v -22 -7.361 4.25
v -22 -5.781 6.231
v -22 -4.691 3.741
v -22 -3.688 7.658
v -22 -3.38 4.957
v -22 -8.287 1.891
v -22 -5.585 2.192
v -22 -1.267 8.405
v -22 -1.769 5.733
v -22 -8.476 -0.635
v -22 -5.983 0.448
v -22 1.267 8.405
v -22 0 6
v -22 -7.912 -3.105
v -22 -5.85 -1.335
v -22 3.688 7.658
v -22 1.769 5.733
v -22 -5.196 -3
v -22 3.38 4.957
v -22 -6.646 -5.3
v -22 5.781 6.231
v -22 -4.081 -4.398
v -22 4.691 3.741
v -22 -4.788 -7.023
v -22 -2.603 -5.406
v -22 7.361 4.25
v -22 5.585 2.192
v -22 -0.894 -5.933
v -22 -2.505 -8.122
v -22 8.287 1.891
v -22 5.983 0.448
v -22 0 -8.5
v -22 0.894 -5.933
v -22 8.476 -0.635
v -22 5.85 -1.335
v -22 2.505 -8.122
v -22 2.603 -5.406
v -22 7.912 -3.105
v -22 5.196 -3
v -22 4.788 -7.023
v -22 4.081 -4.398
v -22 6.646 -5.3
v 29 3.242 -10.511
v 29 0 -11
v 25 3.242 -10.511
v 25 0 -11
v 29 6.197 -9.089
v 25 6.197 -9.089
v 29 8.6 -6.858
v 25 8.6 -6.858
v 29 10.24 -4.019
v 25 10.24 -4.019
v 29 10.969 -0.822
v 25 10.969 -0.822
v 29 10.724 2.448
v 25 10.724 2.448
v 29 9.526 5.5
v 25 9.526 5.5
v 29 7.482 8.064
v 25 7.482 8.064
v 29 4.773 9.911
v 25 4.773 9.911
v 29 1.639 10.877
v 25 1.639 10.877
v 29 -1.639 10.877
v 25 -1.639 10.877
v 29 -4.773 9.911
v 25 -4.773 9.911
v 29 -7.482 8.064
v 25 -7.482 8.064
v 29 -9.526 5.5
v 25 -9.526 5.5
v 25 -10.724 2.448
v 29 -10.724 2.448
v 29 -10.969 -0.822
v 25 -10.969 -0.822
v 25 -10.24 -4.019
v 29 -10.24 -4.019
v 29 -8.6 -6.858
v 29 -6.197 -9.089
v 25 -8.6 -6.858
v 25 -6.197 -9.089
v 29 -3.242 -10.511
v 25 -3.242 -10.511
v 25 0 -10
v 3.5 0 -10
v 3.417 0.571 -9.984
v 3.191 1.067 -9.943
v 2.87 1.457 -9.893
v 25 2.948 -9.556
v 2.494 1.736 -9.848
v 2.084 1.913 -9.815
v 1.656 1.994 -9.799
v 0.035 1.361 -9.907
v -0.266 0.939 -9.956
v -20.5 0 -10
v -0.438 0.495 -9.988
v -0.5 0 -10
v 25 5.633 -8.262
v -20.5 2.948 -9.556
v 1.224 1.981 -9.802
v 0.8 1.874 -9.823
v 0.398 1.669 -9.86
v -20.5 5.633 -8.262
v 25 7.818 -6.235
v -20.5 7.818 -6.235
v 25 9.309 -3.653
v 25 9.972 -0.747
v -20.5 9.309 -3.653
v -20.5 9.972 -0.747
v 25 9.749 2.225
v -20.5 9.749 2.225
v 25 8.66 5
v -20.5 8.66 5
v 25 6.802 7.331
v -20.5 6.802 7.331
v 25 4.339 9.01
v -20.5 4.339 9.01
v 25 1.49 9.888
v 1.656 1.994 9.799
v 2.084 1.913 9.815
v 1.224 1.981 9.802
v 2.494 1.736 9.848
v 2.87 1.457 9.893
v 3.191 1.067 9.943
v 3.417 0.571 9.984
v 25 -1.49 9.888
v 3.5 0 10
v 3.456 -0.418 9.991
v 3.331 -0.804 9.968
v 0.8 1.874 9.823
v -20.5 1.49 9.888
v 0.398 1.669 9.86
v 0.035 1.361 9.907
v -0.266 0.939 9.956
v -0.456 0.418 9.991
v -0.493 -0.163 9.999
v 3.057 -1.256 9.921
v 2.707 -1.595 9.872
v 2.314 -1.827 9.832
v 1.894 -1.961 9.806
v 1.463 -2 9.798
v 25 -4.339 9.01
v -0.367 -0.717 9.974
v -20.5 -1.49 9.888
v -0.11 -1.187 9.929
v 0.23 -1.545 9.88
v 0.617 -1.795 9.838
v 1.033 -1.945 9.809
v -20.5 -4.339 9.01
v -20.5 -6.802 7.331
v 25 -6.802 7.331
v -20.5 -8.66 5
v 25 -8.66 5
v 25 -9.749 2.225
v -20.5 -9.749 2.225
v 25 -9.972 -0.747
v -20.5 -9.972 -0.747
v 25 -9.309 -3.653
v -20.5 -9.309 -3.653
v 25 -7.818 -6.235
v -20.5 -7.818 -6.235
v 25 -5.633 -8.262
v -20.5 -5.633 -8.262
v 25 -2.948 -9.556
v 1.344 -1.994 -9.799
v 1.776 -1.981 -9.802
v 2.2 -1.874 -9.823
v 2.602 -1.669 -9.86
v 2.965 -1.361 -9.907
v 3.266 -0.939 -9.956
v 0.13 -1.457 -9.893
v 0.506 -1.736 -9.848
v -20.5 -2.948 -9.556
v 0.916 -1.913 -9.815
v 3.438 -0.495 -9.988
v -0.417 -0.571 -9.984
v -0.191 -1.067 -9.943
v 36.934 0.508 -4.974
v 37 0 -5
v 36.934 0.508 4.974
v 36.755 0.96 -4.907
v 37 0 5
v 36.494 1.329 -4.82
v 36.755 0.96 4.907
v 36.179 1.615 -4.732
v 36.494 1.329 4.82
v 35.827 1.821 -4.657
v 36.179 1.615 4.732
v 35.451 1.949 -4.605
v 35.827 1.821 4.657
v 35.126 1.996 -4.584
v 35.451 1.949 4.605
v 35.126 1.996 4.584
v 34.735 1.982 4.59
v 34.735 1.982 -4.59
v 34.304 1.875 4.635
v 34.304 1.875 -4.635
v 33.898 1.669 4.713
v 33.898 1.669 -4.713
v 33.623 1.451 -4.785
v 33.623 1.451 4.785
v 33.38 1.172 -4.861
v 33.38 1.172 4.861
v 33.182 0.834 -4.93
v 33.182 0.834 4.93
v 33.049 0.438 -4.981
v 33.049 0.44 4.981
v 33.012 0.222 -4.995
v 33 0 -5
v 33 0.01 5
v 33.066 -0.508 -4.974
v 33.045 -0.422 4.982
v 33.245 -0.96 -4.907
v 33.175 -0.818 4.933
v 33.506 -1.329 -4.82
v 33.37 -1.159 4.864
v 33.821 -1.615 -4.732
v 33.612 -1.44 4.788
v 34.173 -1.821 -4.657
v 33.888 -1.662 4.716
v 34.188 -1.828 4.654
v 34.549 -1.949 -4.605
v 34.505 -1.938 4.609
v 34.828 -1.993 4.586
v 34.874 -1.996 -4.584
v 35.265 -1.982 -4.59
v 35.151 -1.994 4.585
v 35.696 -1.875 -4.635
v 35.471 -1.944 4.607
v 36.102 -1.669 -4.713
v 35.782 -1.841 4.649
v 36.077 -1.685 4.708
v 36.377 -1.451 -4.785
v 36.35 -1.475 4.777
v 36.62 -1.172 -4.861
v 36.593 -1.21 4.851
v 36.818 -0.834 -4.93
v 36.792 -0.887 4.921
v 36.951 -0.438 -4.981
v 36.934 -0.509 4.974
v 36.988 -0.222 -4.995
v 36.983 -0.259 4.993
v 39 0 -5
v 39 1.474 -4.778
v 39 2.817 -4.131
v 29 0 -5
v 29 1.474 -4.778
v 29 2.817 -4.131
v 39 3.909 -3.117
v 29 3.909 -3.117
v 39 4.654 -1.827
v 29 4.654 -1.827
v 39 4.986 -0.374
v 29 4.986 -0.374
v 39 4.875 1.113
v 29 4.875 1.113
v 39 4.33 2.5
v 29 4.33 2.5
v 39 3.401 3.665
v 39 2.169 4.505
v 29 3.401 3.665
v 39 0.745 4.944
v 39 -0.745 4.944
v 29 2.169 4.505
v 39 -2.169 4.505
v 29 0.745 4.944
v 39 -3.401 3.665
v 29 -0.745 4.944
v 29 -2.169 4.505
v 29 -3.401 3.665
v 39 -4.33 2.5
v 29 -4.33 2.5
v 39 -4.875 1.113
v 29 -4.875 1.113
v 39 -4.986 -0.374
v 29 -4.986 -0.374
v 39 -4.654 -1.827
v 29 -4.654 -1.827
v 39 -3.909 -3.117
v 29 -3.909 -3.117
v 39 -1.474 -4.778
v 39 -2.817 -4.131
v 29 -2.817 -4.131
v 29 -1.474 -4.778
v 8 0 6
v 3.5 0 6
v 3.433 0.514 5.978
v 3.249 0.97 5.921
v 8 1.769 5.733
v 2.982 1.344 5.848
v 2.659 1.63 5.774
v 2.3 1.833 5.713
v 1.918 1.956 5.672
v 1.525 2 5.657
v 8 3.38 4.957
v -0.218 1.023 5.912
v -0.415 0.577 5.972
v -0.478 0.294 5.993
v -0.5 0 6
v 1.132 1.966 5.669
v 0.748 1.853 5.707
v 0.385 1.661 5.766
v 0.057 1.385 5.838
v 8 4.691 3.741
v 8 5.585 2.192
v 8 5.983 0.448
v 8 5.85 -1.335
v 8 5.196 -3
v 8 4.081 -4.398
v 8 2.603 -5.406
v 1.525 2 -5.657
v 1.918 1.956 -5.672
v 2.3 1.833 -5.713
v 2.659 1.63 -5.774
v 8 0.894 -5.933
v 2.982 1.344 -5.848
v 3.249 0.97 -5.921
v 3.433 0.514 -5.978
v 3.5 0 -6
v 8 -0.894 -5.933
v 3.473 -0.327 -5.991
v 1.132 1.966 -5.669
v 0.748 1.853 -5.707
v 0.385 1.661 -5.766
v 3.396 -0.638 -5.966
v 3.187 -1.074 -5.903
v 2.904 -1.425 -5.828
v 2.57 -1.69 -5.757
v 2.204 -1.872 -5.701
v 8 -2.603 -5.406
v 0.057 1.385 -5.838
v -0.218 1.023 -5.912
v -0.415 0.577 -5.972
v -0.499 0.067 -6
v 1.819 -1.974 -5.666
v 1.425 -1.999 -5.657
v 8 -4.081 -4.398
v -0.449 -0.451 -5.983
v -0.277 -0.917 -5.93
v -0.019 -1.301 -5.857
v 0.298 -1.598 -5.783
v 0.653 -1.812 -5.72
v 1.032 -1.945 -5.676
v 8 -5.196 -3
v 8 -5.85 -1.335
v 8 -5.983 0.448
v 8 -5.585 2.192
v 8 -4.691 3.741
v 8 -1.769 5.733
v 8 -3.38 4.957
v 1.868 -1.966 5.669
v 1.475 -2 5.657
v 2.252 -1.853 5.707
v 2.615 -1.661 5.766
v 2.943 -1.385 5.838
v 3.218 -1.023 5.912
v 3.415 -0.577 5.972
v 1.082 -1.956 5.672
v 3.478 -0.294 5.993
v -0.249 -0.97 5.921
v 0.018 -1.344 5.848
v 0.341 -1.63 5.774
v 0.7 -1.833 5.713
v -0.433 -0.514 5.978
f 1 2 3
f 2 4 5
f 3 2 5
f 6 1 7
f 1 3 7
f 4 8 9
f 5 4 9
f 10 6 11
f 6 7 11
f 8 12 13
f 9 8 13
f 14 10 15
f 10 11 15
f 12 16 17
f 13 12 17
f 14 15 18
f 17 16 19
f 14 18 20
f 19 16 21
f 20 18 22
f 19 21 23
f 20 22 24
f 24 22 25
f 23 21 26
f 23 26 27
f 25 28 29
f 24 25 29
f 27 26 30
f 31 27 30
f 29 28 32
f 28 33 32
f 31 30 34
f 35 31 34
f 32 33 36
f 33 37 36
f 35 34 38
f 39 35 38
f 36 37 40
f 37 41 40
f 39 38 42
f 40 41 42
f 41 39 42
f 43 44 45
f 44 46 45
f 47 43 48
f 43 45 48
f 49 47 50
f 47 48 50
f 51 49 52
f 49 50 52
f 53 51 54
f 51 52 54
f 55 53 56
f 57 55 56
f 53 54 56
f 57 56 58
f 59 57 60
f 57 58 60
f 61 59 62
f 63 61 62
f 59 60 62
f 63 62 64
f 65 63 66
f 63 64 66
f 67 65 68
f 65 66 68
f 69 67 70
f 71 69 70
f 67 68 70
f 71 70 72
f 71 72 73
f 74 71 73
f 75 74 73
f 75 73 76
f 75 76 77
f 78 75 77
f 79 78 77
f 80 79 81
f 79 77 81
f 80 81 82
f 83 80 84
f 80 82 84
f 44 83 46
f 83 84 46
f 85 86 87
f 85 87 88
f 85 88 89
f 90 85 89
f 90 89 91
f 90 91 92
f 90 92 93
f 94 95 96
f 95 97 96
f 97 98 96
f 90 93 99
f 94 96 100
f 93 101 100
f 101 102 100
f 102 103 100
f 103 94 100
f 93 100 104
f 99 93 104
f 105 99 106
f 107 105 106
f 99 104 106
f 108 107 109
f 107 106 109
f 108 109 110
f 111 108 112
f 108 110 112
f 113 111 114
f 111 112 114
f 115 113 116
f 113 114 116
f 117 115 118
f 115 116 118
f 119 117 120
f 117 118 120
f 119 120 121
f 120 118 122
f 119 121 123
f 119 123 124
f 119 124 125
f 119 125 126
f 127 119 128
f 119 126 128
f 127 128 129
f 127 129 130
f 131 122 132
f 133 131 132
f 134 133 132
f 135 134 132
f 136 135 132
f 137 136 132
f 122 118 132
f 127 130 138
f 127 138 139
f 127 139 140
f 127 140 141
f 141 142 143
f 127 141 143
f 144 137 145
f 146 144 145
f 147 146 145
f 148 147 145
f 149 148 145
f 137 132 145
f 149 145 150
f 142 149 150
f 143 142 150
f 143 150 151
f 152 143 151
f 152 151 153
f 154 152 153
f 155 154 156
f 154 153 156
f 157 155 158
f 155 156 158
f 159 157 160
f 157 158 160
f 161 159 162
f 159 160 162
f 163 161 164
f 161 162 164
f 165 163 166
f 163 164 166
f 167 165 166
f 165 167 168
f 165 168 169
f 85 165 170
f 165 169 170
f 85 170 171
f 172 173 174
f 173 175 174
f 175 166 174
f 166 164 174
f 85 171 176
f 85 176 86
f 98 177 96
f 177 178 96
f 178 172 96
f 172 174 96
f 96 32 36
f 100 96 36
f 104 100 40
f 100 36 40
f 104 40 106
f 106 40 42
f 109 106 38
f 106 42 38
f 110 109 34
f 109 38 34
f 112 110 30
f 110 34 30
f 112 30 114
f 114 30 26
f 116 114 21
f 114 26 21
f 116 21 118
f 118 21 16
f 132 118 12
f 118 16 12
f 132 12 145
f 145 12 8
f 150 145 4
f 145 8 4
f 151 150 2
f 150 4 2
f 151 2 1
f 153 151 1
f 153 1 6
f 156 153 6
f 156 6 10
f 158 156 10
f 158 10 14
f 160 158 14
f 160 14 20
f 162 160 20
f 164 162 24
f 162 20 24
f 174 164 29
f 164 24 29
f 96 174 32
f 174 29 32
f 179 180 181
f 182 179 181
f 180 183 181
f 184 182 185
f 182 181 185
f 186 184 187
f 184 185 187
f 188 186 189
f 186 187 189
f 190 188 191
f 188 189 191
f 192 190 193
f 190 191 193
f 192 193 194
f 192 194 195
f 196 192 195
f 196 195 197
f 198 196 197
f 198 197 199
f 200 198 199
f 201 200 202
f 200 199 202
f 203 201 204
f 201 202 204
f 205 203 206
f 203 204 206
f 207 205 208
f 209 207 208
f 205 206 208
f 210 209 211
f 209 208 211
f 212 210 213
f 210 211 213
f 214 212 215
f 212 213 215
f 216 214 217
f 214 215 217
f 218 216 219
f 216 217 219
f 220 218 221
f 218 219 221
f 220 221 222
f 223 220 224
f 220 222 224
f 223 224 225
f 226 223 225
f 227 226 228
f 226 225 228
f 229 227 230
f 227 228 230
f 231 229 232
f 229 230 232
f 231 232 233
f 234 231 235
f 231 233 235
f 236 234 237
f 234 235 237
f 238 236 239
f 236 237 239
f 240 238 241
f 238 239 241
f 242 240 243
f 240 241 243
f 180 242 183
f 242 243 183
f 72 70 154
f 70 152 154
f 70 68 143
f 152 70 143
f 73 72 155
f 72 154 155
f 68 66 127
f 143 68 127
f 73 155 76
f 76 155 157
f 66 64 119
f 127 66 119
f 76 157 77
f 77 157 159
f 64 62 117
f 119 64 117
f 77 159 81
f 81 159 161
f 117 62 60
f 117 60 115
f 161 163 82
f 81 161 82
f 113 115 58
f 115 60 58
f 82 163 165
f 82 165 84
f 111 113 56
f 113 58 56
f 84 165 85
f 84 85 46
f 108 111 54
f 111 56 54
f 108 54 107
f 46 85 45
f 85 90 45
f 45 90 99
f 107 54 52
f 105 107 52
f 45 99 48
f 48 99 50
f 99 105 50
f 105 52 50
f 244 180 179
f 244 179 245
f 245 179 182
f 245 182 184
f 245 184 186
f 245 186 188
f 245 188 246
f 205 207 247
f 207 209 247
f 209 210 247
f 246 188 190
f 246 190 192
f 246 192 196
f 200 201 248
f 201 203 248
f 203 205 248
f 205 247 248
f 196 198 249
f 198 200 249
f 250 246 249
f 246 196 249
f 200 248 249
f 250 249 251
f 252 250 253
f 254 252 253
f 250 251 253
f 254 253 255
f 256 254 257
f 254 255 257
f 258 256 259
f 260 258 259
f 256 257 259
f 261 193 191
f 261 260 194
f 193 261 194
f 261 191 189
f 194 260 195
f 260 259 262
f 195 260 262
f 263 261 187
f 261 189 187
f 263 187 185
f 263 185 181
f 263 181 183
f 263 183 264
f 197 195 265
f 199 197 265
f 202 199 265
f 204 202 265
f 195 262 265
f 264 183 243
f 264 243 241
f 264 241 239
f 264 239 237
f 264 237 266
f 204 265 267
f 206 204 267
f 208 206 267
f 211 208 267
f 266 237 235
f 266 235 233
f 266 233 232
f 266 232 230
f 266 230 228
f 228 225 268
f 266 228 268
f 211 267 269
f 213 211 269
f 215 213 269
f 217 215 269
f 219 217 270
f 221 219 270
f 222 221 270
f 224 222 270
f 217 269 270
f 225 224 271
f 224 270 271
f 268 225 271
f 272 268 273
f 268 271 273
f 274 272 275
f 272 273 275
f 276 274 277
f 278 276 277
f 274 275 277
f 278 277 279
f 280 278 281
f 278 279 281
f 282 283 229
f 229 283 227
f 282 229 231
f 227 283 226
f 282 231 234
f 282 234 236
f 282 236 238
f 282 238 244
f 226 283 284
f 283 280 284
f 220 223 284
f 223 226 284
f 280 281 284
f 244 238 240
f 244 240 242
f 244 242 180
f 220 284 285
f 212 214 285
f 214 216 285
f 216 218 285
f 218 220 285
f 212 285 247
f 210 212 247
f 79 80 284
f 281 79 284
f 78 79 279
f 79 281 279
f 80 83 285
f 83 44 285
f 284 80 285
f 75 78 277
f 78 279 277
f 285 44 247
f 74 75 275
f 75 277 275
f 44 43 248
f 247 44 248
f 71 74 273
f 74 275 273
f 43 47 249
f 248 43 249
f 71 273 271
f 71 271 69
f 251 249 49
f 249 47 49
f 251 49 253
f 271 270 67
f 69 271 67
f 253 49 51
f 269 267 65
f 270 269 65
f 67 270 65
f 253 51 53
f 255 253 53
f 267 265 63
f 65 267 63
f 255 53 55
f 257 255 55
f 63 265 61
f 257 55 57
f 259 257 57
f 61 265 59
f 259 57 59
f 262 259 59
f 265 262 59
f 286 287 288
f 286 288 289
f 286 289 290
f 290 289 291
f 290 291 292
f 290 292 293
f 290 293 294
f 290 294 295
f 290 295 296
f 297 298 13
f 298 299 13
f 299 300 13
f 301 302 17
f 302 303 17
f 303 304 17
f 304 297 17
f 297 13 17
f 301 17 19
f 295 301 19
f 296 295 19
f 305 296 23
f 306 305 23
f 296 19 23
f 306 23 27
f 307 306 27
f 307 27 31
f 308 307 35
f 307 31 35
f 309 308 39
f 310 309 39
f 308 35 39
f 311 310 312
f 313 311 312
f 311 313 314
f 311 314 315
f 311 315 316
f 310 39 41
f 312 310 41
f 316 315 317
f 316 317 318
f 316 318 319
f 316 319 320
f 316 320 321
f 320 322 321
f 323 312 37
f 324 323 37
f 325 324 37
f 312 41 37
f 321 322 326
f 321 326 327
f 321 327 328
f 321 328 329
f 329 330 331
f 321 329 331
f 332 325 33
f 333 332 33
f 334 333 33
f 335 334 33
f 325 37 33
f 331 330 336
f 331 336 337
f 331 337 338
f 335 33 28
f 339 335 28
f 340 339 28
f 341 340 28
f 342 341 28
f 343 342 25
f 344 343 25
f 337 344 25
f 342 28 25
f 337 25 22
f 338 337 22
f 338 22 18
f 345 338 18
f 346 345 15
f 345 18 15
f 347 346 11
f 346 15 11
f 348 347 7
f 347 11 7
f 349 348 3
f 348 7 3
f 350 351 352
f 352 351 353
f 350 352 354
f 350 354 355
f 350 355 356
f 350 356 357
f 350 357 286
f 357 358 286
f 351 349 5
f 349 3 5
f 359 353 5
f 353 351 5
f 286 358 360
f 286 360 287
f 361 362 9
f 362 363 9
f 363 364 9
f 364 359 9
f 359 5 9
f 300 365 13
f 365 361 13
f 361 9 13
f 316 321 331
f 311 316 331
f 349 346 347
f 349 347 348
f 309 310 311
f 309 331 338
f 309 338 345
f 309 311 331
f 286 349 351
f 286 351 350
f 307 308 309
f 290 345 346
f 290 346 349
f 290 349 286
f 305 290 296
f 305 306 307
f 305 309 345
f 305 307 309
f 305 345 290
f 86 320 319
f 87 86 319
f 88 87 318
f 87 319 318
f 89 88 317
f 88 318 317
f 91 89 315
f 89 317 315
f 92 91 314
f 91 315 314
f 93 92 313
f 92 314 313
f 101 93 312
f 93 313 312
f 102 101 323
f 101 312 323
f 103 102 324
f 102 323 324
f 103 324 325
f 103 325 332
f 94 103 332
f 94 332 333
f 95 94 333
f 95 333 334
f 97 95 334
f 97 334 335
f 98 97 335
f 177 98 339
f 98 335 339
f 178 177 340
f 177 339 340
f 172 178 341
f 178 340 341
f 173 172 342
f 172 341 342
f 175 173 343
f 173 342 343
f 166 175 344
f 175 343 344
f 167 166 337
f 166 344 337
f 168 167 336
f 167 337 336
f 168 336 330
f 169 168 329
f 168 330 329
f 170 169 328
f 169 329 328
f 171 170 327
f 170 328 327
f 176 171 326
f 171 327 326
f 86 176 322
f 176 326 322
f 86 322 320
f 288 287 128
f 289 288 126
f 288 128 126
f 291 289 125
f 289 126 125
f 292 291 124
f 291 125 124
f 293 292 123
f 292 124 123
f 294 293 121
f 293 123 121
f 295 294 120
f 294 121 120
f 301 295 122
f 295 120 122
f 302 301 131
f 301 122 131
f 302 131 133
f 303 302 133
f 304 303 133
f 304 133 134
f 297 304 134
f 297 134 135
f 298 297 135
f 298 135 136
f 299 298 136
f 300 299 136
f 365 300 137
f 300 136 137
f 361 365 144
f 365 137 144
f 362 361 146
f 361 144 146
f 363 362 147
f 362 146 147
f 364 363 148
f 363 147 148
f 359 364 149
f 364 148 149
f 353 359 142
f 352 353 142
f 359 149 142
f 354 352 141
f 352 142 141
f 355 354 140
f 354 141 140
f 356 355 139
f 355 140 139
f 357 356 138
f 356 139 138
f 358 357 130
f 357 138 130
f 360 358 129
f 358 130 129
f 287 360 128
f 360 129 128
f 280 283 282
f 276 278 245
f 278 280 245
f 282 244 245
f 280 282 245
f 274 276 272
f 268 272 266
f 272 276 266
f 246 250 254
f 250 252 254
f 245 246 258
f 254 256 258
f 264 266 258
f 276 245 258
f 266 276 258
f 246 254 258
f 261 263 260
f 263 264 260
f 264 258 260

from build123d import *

# Parameters (mm, degrees)
SZKIC3_R                   = 6
WYTNIJ_WYCI_GNI_CIE1_DEPTH = 30
SFAZOWANIE1_SIZE           = 1.5
SZKIC6_R                   = 2
WYTNIJ_WYCI_GNI_CIE4_DEPTH = 15


with BuildPart() as part:
    # Szkic1 → Obrót1 (revolve)
    with BuildSketch(Plane(origin=(0, 0, 0), x_dir=(1, 0, 0), z_dir=(0, 1, 0))):
        Polygon((-22, 0), (39, 0), (39, 5), (29, 5), (29, 11), (25, 11), (25, 10), (-22, 10), align=None)
    revolve(axis=Axis((-22, 0, 0), (1, 0, 0)))

    # Szkic3 → Wytnij-wyciągnięcie1 (cut)
    with BuildSketch(Plane.ZY.offset(22)):
        Circle(SZKIC3_R)
    extrude(amount=-WYTNIJ_WYCI_GNI_CIE1_DEPTH, mode=Mode.SUBTRACT)

    # Sfazowanie1
    sfazowanie1_edges = [part.edges().sort_by_distance(p)[0] for p in [
        (-22, 0, 10),
    ]]
    chamfer(sfazowanie1_edges, length=SFAZOWANIE1_SIZE)

    # Szkic6 → Wytnij-wyciągnięcie4 (cut, symmetric)
    with BuildSketch(Plane.XY):
        with Locations((35, 0)):
            Circle(SZKIC6_R)
        with Locations((1.5, 0)):
            Circle(SZKIC6_R)
    extrude(amount=WYTNIJ_WYCI_GNI_CIE4_DEPTH, both=True, mode=Mode.SUBTRACT)


solid = part.part
